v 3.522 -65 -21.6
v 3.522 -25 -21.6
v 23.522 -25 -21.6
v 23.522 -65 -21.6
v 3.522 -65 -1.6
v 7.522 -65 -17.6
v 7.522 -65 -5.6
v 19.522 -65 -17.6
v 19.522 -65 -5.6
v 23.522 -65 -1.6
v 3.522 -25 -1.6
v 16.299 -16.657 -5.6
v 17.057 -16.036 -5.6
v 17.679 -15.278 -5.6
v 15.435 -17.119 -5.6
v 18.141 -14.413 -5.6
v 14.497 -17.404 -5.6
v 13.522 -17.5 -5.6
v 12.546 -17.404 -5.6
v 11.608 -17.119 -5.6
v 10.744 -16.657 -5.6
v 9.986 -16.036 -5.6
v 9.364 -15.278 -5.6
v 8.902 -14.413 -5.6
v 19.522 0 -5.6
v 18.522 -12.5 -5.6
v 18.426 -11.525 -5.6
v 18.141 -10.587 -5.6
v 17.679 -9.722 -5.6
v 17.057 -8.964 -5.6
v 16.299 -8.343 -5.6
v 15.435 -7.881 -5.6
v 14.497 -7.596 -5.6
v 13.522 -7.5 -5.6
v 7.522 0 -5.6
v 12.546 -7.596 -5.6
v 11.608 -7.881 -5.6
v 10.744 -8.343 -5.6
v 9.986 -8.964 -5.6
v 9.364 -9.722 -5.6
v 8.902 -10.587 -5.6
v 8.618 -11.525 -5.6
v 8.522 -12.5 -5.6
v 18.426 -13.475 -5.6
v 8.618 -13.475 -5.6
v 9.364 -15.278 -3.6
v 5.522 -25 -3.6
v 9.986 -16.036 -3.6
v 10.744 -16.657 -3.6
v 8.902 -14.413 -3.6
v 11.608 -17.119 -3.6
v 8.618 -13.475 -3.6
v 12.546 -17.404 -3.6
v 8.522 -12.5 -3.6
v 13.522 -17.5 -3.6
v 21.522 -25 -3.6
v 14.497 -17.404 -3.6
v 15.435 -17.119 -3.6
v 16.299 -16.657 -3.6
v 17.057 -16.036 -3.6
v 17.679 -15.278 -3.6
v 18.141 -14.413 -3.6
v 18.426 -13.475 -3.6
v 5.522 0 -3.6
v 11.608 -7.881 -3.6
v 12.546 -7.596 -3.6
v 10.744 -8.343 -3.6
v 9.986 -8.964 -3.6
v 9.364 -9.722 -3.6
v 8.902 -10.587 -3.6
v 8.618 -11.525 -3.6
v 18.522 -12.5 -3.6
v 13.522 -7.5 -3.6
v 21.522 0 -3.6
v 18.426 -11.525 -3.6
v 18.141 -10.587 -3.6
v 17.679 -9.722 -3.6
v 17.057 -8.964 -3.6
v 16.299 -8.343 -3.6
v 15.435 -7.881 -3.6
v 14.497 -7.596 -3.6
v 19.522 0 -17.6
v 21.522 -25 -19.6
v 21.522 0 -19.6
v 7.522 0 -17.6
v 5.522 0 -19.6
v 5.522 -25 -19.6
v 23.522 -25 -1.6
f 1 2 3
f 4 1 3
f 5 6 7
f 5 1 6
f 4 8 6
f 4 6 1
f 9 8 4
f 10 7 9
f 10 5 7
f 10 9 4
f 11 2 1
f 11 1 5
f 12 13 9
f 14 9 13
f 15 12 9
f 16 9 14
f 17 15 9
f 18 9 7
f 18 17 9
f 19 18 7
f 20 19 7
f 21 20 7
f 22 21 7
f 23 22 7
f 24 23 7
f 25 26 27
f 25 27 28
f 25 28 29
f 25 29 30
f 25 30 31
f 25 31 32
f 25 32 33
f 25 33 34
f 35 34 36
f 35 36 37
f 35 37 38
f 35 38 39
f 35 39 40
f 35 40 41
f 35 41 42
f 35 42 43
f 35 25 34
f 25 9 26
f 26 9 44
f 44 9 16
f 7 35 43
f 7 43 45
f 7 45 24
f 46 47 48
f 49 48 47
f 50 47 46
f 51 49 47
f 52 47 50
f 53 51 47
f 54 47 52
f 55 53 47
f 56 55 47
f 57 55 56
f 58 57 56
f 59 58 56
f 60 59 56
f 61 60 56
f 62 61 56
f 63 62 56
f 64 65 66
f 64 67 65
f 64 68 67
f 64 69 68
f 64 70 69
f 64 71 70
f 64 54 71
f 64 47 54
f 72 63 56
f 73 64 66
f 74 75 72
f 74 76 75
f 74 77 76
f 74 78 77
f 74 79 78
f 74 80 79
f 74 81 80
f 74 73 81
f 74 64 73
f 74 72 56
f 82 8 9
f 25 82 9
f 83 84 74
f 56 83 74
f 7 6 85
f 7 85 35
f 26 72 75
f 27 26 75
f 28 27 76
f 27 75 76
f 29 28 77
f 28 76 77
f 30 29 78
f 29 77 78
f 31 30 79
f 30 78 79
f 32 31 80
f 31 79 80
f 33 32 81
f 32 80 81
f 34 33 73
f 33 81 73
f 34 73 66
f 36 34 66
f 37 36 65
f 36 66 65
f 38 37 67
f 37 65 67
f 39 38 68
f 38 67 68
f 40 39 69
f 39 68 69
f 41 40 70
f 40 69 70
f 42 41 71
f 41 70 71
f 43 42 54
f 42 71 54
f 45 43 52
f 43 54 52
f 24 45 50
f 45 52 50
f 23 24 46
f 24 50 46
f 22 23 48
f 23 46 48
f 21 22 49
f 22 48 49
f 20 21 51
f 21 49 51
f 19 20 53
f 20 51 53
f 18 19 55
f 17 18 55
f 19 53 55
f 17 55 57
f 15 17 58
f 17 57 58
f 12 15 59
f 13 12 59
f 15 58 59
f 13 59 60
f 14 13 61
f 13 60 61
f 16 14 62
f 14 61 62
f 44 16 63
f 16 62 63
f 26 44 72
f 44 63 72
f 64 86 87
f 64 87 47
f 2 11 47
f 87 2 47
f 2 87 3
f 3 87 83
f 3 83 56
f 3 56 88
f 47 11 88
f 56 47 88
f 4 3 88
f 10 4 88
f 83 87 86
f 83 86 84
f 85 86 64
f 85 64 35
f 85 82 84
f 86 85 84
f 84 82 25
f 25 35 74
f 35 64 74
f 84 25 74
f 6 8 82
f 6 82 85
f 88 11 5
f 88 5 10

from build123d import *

# Parameters (mm, degrees)
F0_W     = 16
F0_H     = 16
F1_DEPTH = 25
F2_W     = 12
F2_H     = 12
F3_DEPTH = 25
F4_W     = 20
F4_H     = 20
F5_DEPTH = 40
F6_R     = 5
F7_DEPTH = 2
F8_W     = 12
F8_H     = 12
F9_DEPTH = 40


with BuildPart() as f1:
    # F0 (on Front) → F1 (new body)
    with BuildSketch(Plane.XZ):
        with Locations((13.521624, -11.600108)):
            Rectangle(F0_W, F0_H)
    extrude(amount=F1_DEPTH)

    # F2 (on face) → F3 (cut)
    with BuildSketch(Plane(origin=(0, 0, 0), x_dir=(-1, 0, 0), z_dir=(0, 1, 0))):
        with Locations((-13.521624, -11.600108)):
            Rectangle(F2_W, F2_H)
    extrude(amount=-F3_DEPTH, mode=Mode.SUBTRACT)

    # F4 (on face) → F5 (join)
    with BuildSketch(Plane.XZ.offset(25)):
        with Locations((13.521624, -11.600108)):
            Rectangle(F4_W, F4_H)
    extrude(amount=F5_DEPTH)

    # F6 (on face) → F7 (cut, through all)
    with BuildSketch(Plane.XY.offset(-3.600108)):
        with Locations((13.521624, -12.5)):
            Circle(F6_R)
    extrude(amount=-F7_DEPTH, mode=Mode.SUBTRACT)

    # F8 (on face) → F9 (cut, through all)
    with BuildSketch(Plane(origin=(0, -25, 0), x_dir=(-1, 0, 0), z_dir=(0, 1, 0))):
        with Locations((-13.521624, -11.600108)):
            Rectangle(F8_W, F8_H)
    extrude(amount=-F9_DEPTH, mode=Mode.SUBTRACT)


solid = f1.part
